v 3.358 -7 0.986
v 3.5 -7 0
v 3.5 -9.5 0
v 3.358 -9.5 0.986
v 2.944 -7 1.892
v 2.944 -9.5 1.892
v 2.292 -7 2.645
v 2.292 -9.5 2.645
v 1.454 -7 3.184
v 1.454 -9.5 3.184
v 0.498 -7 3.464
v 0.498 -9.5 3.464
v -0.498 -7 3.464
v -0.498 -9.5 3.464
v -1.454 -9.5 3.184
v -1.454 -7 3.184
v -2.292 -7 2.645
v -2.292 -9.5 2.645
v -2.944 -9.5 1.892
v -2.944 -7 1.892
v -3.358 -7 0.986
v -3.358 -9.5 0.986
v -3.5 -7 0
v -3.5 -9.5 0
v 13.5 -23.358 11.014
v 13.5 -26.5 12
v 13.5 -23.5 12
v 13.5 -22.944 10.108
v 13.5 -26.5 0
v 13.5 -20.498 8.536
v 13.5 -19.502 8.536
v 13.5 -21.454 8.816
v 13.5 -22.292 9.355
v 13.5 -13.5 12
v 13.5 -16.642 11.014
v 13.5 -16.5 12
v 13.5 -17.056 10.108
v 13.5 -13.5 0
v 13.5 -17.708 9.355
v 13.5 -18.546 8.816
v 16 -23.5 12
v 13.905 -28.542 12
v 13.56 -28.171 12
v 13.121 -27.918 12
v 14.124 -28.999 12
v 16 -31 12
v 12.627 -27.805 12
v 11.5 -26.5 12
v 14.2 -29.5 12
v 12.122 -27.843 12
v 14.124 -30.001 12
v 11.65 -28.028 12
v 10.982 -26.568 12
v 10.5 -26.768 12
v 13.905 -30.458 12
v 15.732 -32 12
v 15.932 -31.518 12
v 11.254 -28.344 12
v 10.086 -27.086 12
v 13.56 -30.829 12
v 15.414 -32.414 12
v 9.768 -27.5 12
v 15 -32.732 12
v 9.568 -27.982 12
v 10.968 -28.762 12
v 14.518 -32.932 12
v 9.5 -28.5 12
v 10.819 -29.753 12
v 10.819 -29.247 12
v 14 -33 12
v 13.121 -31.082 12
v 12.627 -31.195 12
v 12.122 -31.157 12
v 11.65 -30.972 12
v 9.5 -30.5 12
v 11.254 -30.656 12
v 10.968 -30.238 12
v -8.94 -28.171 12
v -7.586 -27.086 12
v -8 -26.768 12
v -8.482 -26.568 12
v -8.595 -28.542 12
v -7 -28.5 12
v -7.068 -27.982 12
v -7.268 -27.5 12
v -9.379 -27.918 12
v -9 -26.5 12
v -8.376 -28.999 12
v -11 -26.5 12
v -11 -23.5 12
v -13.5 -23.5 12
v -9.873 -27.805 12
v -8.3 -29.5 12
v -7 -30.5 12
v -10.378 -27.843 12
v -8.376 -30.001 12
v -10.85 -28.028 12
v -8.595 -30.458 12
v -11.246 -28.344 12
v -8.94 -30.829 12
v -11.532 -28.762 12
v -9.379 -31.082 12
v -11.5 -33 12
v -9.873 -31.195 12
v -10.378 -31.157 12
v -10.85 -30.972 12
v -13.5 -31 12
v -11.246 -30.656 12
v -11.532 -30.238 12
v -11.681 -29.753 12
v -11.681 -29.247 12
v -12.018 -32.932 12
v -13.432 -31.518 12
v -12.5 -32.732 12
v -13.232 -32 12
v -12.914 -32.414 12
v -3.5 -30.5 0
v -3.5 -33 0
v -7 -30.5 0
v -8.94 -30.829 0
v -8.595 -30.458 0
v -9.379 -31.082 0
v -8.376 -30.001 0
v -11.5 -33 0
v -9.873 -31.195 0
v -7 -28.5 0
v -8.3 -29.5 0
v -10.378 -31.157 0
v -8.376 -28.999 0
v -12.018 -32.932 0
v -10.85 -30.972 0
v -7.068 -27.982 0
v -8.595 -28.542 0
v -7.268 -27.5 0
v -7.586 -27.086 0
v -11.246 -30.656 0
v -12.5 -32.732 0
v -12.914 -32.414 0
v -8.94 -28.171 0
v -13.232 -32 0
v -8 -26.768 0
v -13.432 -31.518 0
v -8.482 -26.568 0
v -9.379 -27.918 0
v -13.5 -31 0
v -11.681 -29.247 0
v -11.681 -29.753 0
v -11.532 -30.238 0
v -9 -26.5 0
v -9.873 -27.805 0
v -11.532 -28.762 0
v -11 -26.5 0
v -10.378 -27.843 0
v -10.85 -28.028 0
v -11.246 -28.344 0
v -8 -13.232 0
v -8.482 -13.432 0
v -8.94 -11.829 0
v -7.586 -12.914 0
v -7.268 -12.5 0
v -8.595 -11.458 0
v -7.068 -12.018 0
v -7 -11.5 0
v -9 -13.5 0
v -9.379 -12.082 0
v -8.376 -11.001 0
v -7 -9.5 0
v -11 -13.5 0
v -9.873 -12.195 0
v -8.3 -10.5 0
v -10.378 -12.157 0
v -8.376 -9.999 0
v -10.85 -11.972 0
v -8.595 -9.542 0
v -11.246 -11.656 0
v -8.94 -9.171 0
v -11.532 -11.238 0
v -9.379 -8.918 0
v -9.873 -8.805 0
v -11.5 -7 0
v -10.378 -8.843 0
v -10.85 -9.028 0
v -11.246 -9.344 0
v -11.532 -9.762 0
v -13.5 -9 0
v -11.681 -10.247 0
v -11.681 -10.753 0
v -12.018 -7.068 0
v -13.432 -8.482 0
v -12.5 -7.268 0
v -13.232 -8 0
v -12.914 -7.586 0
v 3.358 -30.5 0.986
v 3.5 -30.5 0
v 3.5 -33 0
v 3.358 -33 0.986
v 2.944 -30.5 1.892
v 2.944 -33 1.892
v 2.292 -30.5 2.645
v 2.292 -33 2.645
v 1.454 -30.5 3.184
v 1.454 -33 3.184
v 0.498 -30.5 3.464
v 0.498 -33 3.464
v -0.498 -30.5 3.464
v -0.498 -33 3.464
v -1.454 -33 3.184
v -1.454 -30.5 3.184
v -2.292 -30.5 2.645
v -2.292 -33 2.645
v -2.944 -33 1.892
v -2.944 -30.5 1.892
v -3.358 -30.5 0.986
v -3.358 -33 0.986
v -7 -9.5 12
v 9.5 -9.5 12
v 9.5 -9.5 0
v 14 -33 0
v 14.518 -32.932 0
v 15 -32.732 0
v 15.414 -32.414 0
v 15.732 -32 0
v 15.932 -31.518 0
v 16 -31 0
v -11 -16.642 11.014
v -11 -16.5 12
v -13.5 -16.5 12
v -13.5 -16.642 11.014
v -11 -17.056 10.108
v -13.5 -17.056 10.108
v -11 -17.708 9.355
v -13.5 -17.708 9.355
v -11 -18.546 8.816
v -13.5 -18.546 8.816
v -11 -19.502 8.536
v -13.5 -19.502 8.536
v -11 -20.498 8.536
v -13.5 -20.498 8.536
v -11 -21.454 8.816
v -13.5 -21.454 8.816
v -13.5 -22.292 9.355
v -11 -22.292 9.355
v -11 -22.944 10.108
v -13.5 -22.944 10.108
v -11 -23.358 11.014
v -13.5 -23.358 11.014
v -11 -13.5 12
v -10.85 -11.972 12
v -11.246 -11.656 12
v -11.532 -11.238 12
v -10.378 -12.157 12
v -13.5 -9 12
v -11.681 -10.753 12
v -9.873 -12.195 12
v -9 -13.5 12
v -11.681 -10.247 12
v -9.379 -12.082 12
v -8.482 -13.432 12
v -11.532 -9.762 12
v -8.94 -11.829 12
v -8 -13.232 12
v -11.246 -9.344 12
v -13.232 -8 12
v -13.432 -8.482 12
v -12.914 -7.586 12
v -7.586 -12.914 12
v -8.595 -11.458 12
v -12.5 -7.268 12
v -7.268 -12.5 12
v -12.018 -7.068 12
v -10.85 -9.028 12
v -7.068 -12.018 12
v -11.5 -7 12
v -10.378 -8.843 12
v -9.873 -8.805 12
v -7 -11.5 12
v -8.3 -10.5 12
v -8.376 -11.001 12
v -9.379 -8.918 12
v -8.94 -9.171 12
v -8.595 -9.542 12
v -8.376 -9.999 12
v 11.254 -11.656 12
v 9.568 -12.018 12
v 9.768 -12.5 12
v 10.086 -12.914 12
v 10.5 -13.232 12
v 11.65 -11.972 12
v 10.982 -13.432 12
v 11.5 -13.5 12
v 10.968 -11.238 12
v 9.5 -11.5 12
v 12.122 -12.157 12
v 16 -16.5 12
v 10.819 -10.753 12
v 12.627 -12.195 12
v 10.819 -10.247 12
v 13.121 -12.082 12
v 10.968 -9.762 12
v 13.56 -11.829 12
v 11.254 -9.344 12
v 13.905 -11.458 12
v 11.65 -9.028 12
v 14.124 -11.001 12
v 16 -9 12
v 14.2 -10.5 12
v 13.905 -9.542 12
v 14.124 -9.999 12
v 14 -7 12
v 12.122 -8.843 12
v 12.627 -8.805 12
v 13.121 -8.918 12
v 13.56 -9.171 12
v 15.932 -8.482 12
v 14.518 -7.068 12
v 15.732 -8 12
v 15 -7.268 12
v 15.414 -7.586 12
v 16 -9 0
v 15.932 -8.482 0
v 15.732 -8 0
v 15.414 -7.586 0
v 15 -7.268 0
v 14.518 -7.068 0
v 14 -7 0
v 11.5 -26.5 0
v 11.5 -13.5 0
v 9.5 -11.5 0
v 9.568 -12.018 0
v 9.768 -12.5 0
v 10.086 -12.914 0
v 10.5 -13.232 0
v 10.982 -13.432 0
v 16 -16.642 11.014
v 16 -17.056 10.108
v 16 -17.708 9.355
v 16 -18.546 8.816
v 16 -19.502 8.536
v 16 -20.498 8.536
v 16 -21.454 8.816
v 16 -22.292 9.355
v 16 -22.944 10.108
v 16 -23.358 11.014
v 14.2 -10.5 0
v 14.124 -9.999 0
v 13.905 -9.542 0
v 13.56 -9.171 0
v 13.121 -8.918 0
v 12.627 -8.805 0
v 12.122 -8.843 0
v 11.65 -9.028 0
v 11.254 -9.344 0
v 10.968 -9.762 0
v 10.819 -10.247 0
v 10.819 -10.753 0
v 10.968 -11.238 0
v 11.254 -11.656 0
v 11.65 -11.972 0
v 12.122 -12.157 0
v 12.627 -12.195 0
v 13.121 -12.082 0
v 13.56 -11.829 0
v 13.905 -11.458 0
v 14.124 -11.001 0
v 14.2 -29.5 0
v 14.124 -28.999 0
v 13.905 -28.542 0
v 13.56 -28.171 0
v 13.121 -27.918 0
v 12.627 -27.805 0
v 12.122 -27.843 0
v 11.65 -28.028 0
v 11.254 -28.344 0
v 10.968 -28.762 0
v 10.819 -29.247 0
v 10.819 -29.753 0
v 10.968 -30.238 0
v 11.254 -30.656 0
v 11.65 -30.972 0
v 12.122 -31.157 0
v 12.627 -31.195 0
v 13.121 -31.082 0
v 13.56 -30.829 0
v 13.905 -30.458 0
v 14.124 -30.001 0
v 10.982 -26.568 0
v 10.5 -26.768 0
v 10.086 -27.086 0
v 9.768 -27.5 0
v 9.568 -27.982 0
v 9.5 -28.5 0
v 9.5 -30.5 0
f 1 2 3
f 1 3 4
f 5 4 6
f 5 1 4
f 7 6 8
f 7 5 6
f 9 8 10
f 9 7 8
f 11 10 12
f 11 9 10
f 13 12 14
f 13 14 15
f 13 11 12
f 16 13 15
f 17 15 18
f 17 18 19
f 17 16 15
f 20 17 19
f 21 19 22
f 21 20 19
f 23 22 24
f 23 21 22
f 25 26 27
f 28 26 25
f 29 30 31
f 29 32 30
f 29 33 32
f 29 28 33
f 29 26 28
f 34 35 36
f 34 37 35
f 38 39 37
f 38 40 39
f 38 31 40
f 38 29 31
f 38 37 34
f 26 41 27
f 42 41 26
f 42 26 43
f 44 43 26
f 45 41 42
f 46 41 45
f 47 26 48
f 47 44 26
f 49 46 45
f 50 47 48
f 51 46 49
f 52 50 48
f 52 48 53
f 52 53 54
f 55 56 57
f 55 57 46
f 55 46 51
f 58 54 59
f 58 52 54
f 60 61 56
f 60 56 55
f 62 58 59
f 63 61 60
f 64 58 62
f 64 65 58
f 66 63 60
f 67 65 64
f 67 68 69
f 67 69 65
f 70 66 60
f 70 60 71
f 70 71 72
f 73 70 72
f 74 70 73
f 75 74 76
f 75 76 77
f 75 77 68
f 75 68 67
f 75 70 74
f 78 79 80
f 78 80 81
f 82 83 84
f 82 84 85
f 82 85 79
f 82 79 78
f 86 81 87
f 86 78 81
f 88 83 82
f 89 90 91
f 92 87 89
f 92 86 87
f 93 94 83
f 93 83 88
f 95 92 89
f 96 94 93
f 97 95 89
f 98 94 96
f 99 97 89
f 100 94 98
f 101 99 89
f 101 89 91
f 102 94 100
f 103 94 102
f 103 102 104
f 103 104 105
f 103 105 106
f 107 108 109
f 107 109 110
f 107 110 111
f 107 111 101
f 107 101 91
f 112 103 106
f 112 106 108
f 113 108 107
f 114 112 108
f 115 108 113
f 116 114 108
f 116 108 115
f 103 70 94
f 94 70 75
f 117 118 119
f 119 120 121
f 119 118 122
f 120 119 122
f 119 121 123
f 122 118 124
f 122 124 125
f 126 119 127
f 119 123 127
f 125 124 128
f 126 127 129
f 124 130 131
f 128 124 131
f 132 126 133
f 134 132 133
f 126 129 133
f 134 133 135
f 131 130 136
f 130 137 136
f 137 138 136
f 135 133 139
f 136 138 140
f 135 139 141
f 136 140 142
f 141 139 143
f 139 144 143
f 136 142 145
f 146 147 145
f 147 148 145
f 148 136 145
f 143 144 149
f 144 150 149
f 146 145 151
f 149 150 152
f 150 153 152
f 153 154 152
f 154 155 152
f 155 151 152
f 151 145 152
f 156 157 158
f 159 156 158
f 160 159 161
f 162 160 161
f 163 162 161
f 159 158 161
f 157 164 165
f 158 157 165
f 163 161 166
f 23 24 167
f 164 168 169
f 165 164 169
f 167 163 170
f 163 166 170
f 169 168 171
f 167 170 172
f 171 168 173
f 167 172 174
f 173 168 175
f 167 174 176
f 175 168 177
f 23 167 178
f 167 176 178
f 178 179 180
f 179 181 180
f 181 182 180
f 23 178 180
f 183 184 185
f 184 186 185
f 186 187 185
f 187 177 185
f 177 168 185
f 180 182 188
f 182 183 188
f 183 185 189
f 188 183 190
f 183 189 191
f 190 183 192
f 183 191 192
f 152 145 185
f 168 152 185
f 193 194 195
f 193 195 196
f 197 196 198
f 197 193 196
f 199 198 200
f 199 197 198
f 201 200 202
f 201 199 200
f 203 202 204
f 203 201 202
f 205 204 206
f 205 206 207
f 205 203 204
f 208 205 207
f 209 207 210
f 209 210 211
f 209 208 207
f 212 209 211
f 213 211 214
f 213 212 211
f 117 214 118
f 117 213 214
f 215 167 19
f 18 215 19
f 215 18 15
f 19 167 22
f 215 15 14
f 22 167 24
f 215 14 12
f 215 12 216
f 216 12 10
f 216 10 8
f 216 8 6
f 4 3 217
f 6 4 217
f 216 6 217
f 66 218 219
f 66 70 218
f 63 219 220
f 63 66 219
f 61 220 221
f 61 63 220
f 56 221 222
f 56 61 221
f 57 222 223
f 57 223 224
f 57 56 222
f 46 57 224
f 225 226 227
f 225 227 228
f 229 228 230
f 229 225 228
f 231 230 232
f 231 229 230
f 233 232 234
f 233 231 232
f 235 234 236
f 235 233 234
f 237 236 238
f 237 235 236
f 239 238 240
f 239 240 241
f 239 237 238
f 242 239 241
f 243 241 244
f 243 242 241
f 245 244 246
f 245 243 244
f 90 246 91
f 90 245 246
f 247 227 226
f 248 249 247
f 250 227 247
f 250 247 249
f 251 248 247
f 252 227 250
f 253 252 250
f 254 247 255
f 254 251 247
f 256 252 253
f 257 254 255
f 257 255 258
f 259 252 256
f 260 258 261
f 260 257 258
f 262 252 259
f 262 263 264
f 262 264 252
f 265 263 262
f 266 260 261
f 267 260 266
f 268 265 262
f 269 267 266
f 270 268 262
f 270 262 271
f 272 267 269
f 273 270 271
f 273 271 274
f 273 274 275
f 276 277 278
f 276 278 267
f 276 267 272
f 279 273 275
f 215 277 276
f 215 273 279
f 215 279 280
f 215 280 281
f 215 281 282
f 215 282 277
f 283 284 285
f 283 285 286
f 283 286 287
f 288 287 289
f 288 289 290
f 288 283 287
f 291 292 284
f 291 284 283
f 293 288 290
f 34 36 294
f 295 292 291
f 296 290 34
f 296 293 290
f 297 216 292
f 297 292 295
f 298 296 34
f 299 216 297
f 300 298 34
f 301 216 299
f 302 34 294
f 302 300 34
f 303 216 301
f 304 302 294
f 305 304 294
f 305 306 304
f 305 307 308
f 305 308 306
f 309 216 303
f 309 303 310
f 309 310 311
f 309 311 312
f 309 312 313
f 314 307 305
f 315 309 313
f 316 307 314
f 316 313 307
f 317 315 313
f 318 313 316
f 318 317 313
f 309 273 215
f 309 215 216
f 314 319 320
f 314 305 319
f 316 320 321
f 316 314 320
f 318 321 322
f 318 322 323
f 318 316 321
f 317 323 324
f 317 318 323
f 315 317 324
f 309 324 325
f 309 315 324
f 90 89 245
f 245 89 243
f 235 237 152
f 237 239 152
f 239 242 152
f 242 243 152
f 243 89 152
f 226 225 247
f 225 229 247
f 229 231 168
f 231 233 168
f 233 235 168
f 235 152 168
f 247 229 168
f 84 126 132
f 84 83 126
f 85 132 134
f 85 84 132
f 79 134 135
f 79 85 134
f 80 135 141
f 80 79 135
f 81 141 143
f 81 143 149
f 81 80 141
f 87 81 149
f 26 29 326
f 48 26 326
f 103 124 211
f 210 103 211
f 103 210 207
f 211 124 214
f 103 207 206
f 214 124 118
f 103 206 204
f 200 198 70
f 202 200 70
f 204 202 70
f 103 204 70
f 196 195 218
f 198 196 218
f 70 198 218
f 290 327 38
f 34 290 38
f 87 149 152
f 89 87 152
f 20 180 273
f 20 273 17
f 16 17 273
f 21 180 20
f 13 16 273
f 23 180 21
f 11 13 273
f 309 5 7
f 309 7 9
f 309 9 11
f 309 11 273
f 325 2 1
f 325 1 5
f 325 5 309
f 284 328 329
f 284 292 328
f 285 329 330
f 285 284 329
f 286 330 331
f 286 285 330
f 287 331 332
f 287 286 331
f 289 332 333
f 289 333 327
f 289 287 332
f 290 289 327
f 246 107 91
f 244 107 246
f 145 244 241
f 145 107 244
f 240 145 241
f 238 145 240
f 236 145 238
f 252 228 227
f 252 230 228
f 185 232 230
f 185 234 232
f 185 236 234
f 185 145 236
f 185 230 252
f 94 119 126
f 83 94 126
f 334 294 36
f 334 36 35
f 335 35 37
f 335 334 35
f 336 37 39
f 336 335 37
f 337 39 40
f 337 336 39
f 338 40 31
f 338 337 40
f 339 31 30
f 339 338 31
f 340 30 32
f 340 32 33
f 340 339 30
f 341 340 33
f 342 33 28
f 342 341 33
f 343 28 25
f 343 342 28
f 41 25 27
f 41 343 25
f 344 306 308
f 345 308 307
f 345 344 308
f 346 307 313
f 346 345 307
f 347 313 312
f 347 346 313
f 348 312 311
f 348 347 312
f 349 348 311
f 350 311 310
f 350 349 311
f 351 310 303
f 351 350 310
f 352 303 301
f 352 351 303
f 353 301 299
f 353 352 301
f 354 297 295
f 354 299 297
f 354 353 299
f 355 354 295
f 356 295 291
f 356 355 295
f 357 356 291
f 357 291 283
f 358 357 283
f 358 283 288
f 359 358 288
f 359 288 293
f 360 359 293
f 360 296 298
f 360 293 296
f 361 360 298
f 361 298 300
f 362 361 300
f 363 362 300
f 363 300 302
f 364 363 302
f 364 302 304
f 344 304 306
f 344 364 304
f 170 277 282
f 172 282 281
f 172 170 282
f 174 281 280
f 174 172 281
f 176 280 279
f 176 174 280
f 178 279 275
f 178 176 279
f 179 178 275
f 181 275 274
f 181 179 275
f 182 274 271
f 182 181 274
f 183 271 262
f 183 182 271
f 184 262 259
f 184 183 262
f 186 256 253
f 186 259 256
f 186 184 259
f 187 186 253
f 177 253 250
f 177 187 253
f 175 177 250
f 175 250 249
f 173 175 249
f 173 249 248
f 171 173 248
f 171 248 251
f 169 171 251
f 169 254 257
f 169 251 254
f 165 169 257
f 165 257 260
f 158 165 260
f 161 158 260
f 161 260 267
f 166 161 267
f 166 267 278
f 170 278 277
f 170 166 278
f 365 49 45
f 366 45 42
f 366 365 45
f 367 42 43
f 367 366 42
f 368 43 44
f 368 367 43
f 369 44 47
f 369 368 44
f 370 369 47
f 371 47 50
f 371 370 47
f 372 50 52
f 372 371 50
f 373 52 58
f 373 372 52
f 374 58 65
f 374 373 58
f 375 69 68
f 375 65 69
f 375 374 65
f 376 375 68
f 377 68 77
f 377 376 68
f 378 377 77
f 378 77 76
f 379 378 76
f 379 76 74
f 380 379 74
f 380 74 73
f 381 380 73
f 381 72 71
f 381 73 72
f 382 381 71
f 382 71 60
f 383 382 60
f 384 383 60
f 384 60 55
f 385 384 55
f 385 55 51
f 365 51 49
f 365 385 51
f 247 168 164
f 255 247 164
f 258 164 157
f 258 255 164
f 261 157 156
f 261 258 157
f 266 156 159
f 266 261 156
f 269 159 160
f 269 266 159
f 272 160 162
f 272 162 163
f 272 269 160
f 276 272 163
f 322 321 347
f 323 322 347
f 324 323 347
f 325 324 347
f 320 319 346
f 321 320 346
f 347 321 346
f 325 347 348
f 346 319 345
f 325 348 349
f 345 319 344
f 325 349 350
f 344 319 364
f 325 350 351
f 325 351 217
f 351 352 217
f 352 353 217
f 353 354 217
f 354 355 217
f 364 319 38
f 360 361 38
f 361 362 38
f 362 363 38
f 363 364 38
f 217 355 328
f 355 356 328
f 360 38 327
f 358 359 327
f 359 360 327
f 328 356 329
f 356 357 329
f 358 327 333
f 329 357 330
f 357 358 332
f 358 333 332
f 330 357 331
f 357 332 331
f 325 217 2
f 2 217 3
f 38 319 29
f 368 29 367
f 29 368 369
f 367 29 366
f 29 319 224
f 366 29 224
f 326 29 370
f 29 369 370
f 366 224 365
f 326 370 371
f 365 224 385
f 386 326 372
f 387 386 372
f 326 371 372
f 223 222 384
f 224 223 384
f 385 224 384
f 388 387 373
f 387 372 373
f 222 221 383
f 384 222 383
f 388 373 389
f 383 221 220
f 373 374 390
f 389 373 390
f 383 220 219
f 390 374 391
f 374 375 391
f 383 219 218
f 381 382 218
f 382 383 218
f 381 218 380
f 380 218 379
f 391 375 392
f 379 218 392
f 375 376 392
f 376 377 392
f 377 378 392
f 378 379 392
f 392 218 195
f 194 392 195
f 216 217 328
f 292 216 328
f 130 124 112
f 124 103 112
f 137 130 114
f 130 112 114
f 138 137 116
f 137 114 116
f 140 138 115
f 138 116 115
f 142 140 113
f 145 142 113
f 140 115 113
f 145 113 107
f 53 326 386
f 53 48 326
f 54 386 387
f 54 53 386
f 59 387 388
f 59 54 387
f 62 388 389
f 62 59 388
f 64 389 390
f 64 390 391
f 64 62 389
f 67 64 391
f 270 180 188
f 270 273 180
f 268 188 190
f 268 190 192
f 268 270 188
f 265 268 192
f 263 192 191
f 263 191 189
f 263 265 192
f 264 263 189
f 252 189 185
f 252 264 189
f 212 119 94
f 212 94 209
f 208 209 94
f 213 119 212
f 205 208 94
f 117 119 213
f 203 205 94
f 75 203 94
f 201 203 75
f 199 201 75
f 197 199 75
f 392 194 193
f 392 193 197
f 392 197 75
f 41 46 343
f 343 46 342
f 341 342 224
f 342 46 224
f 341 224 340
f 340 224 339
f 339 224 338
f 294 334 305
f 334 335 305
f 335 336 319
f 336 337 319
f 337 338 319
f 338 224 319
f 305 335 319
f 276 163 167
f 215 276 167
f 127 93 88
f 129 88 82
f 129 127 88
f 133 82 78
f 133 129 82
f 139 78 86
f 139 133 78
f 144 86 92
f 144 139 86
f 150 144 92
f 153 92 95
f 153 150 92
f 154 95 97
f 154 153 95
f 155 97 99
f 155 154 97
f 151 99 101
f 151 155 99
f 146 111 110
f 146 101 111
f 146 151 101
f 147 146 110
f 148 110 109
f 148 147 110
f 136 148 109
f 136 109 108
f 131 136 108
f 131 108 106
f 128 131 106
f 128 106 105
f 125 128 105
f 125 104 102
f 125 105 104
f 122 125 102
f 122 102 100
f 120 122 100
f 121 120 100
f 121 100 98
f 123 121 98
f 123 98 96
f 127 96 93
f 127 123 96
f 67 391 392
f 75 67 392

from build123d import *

# Parameters (mm, degrees)
CYLINDER135_R             = 1.7
CYLINDER135_DEPTH         = 16
CYLINDER136_R             = 1.7
CYLINDER136_DEPTH         = 16
CYLINDER137_R             = 1.7
CYLINDER137_DEPTH         = 16
CYLINDER138_R             = 1.7
CYLINDER138_DEPTH         = 16
CYLINDER083_R             = 3.5
CYLINDER083_DEPTH         = 2.5
BOX028_W                  = 29.5
BOX028_H                  = 2.5
BOX028_DEPTH              = 12
CYLINDER085_R             = 3.5
CYLINDER085_DEPTH         = 2.5
BOX034_W                  = 29.5
BOX034_H                  = 2.5
BOX034_DEPTH              = 12
CYLINDER086_R             = 3.5
CYLINDER086_DEPTH         = 2.5
BOX018_W                  = 2.5
BOX018_H                  = 21
BOX018_DEPTH              = 12
BOX042_W                  = 4
BOX042_H                  = 4
BOX042_DEPTH              = 12
FILLET002_R               = 2
FILLET002_PLACEMENT_ANGLE = 90
BOX040_W                  = 4
BOX040_H                  = 4
BOX040_DEPTH              = 12
FILLET_R                  = 2
BOX041_W                  = 4
BOX041_H                  = 4
BOX041_DEPTH              = 12
FILLET001_R               = 2
FILLET001_PLACEMENT_ANGLE = 90
BOX043_W                  = 4
BOX043_H                  = 4
BOX043_DEPTH              = 12
FILLET003_R               = 2
FILLET003_PLACEMENT_ANGLE = 180
CYLINDER129_R             = 3.5
CYLINDER129_DEPTH         = 2.5
BOX070_W                  = 2.5
BOX070_H                  = 21
BOX070_DEPTH              = 12
FILLET008_R               = 2


with BuildPart() as cylinder135:
    # Cylinder135 → Cylinder135 (new body)
    with BuildSketch(Plane(origin=(-10, -10.5, 0), x_dir=(1, 0, 0), z_dir=(0, 0, 1))):
        Circle(CYLINDER135_R)
    extrude(amount=CYLINDER135_DEPTH)


with BuildPart() as cylinder136:
    # Cylinder136 → Cylinder136 (new body)
    with BuildSketch(Plane(origin=(-10, -29.5, 0), x_dir=(1, 0, 0), z_dir=(0, 0, 1))):
        Circle(CYLINDER136_R)
    extrude(amount=CYLINDER136_DEPTH)


with BuildPart() as cylinder137:
    # Cylinder137 → Cylinder137 (new body)
    with BuildSketch(Plane(origin=(12.5, -10.5, 0), x_dir=(1, 0, 0), z_dir=(0, 0, 1))):
        Circle(CYLINDER137_R)
    extrude(amount=CYLINDER137_DEPTH)


with BuildPart() as fusion099:
    # Cylinder138 → Cylinder138 (new body)
    with BuildSketch(Plane(origin=(12.5, -29.5, 0), x_dir=(1, 0, 0), z_dir=(0, 0, 1))):
        Circle(CYLINDER138_R)
    extrude(amount=CYLINDER138_DEPTH)

    # Fusion099: union Cylinder135, Cylinder136, Cylinder137
    add(cylinder135.part)
    add(cylinder136.part)
    add(cylinder137.part)


with BuildPart() as cylinder083:
    # Cylinder083 → Cylinder083 (new body)
    with BuildSketch(Plane.XZ.offset(55.5)):
        Circle(CYLINDER083_R)
    extrude(amount=CYLINDER083_DEPTH)


with BuildPart() as cut037:
    # Box028 → Box028 (new body)
    with BuildSketch(Plane(origin=(-13.5, -58, 0), x_dir=(1, 0, 0), z_dir=(0, 0, 1))):
        with Locations((14.75, 1.25)):
            Rectangle(BOX028_W, BOX028_H)
    extrude(amount=BOX028_DEPTH)

    # Cut037: cut Cylinder083
    add(cylinder083.part, mode=Mode.SUBTRACT)


with BuildPart() as cut037_1:
    # Cut037 placement: moved
    add(cut037.part.moved(Location((0, 25, 0))))


with BuildPart() as cylinder085:
    # Cylinder085 → Cylinder085 (new body)
    with BuildSketch(Plane.XZ.offset(55.5)):
        Circle(CYLINDER085_R)
    extrude(amount=CYLINDER085_DEPTH)


with BuildPart() as cut039:
    # Box034 → Box034 (new body)
    with BuildSketch(Plane(origin=(-13.5, -58, 0), x_dir=(1, 0, 0), z_dir=(0, 0, 1))):
        with Locations((14.75, 1.25)):
            Rectangle(BOX034_W, BOX034_H)
    extrude(amount=BOX034_DEPTH)

    # Cut039: cut Cylinder085
    add(cylinder085.part, mode=Mode.SUBTRACT)


with BuildPart() as cut039_1:
    # Cut039 placement: moved
    add(cut039.part.moved(Location((0, 48.5, 0))))


with BuildPart() as cylinder086:
    # Cylinder086 → Cylinder086 (new body)
    with BuildSketch(Plane(origin=(-11, -20, 12), x_dir=(0, 0, 1), z_dir=(-1, 0, 0))):
        Circle(CYLINDER086_R)
    extrude(amount=CYLINDER086_DEPTH)


with BuildPart() as cut075:
    # Box018 → Box018 (new body)
    with BuildSketch(Plane(origin=(-13.5, -30.5, 0), x_dir=(1, 0, 0), z_dir=(0, 0, 1))):
        with Locations((1.25, 10.5)):
            Rectangle(BOX018_W, BOX018_H)
    extrude(amount=BOX018_DEPTH)

    # Cut075: cut Cylinder086
    add(cylinder086.part, mode=Mode.SUBTRACT)


with BuildPart() as cut075_1:
    # Cut075 placement: moved
    add(cut075.part.moved(Location((27, 0, 0))))


with BuildPart() as fillet002:
    # Box042 → Box042 (new body)
    with BuildSketch(Plane(origin=(-11, -39, 0), x_dir=(1, 0, 0), z_dir=(0, 0, 1))):
        with Locations((2, 2)):
            Rectangle(BOX042_W, BOX042_H)
    extrude(amount=BOX042_DEPTH)

    # Fillet002
    fillet002_edges = [fillet002.edges().sort_by_distance(p)[0] for p in [
        (-7, -39, 6),
    ]]
    fillet(fillet002_edges, radius=FILLET002_R)


with BuildPart() as fillet002_1:
    # Fillet002 placement: moved
    add(fillet002.part.moved(Location((48.5, -20.5, 0))).rotate(Axis((48.5, -20.5, 0), (0, 0, -1)), FILLET002_PLACEMENT_ANGLE))


with BuildPart() as fillet_body:
    # Box040 → Box040 (new body)
    with BuildSketch(Plane(origin=(-11, -39, 0), x_dir=(1, 0, 0), z_dir=(0, 0, 1))):
        with Locations((2, 2)):
            Rectangle(BOX040_W, BOX040_H)
    extrude(amount=BOX040_DEPTH)

    # Fillet
    fillet_edges = [fillet_body.edges().sort_by_distance(p)[0] for p in [
        (-7, -39, 6),
    ]]
    fillet(fillet_edges, radius=FILLET_R)


with BuildPart() as fillet_body_1:
    # Fillet placement: moved
    add(fillet_body.part.moved(Location((0, 25.5, 0))))


with BuildPart() as fillet001:
    # Box041 → Box041 (new body)
    with BuildSketch(Plane(origin=(-11, -39, 0), x_dir=(1, 0, 0), z_dir=(0, 0, 1))):
        with Locations((2, 2)):
            Rectangle(BOX041_W, BOX041_H)
    extrude(amount=BOX041_DEPTH)

    # Fillet001
    fillet001_edges = [fillet001.edges().sort_by_distance(p)[0] for p in [
        (-7, -39, 6),
    ]]
    fillet(fillet001_edges, radius=FILLET001_R)


with BuildPart() as fillet001_1:
    # Fillet001 placement: moved
    add(fillet001.part.moved(Location((-46, -19.5, 0))).rotate(Axis((-46, -19.5, 0), (0, 0, 1)), FILLET001_PLACEMENT_ANGLE))


with BuildPart() as fillet003:
    # Box043 → Box043 (new body)
    with BuildSketch(Plane(origin=(-11, -39, 0), x_dir=(1, 0, 0), z_dir=(0, 0, 1))):
        with Locations((2, 2)):
            Rectangle(BOX043_W, BOX043_H)
    extrude(amount=BOX043_DEPTH)

    # Fillet003
    fillet003_edges = [fillet003.edges().sort_by_distance(p)[0] for p in [
        (-7, -39, 6),
    ]]
    fillet(fillet003_edges, radius=FILLET003_R)


with BuildPart() as fillet003_1:
    # Fillet003 placement: moved
    add(fillet003.part.moved(Location((2.5, -65.5, 0))).rotate(Axis((2.5, -65.5, 0), (0, 0, 1)), FILLET003_PLACEMENT_ANGLE))


with BuildPart() as cylinder129:
    # Cylinder129 → Cylinder129 (new body)
    with BuildSketch(Plane(origin=(-11, -20, 12), x_dir=(0, 0, 1), z_dir=(-1, 0, 0))):
        Circle(CYLINDER129_R)
    extrude(amount=CYLINDER129_DEPTH)


with BuildPart() as fillet008:
    # Box070 → Box070 (new body)
    with BuildSketch(Plane(origin=(-13.5, -30.5, 0), x_dir=(1, 0, 0), z_dir=(0, 0, 1))):
        with Locations((1.25, 10.5)):
            Rectangle(BOX070_W, BOX070_H)
    extrude(amount=BOX070_DEPTH)

    # Cut077: cut Cylinder129
    add(cylinder129.part, mode=Mode.SUBTRACT)

    # Fusion106: union Cut037, Cut039, Cut075, Fillet002, Fillet body, Fillet001, Fillet003
    add(cut037_1.part)
    add(cut039_1.part)
    add(cut075_1.part)
    add(fillet002_1.part)
    add(fillet_body_1.part)
    add(fillet001_1.part)
    add(fillet003_1.part)

    # Cut084: cut Fusion099
    add(fusion099.part, mode=Mode.SUBTRACT)

    # Fillet008
    fillet008_edges = [fillet008.edges().sort_by_distance(p)[0] for p in [
        (-13.5, -7, 6),
        (-13.5, -33, 6),
        (16, -7, 6),
        (16, -33, 6),
    ]]
    fillet(fillet008_edges, radius=FILLET008_R)


solid = fillet008.part
